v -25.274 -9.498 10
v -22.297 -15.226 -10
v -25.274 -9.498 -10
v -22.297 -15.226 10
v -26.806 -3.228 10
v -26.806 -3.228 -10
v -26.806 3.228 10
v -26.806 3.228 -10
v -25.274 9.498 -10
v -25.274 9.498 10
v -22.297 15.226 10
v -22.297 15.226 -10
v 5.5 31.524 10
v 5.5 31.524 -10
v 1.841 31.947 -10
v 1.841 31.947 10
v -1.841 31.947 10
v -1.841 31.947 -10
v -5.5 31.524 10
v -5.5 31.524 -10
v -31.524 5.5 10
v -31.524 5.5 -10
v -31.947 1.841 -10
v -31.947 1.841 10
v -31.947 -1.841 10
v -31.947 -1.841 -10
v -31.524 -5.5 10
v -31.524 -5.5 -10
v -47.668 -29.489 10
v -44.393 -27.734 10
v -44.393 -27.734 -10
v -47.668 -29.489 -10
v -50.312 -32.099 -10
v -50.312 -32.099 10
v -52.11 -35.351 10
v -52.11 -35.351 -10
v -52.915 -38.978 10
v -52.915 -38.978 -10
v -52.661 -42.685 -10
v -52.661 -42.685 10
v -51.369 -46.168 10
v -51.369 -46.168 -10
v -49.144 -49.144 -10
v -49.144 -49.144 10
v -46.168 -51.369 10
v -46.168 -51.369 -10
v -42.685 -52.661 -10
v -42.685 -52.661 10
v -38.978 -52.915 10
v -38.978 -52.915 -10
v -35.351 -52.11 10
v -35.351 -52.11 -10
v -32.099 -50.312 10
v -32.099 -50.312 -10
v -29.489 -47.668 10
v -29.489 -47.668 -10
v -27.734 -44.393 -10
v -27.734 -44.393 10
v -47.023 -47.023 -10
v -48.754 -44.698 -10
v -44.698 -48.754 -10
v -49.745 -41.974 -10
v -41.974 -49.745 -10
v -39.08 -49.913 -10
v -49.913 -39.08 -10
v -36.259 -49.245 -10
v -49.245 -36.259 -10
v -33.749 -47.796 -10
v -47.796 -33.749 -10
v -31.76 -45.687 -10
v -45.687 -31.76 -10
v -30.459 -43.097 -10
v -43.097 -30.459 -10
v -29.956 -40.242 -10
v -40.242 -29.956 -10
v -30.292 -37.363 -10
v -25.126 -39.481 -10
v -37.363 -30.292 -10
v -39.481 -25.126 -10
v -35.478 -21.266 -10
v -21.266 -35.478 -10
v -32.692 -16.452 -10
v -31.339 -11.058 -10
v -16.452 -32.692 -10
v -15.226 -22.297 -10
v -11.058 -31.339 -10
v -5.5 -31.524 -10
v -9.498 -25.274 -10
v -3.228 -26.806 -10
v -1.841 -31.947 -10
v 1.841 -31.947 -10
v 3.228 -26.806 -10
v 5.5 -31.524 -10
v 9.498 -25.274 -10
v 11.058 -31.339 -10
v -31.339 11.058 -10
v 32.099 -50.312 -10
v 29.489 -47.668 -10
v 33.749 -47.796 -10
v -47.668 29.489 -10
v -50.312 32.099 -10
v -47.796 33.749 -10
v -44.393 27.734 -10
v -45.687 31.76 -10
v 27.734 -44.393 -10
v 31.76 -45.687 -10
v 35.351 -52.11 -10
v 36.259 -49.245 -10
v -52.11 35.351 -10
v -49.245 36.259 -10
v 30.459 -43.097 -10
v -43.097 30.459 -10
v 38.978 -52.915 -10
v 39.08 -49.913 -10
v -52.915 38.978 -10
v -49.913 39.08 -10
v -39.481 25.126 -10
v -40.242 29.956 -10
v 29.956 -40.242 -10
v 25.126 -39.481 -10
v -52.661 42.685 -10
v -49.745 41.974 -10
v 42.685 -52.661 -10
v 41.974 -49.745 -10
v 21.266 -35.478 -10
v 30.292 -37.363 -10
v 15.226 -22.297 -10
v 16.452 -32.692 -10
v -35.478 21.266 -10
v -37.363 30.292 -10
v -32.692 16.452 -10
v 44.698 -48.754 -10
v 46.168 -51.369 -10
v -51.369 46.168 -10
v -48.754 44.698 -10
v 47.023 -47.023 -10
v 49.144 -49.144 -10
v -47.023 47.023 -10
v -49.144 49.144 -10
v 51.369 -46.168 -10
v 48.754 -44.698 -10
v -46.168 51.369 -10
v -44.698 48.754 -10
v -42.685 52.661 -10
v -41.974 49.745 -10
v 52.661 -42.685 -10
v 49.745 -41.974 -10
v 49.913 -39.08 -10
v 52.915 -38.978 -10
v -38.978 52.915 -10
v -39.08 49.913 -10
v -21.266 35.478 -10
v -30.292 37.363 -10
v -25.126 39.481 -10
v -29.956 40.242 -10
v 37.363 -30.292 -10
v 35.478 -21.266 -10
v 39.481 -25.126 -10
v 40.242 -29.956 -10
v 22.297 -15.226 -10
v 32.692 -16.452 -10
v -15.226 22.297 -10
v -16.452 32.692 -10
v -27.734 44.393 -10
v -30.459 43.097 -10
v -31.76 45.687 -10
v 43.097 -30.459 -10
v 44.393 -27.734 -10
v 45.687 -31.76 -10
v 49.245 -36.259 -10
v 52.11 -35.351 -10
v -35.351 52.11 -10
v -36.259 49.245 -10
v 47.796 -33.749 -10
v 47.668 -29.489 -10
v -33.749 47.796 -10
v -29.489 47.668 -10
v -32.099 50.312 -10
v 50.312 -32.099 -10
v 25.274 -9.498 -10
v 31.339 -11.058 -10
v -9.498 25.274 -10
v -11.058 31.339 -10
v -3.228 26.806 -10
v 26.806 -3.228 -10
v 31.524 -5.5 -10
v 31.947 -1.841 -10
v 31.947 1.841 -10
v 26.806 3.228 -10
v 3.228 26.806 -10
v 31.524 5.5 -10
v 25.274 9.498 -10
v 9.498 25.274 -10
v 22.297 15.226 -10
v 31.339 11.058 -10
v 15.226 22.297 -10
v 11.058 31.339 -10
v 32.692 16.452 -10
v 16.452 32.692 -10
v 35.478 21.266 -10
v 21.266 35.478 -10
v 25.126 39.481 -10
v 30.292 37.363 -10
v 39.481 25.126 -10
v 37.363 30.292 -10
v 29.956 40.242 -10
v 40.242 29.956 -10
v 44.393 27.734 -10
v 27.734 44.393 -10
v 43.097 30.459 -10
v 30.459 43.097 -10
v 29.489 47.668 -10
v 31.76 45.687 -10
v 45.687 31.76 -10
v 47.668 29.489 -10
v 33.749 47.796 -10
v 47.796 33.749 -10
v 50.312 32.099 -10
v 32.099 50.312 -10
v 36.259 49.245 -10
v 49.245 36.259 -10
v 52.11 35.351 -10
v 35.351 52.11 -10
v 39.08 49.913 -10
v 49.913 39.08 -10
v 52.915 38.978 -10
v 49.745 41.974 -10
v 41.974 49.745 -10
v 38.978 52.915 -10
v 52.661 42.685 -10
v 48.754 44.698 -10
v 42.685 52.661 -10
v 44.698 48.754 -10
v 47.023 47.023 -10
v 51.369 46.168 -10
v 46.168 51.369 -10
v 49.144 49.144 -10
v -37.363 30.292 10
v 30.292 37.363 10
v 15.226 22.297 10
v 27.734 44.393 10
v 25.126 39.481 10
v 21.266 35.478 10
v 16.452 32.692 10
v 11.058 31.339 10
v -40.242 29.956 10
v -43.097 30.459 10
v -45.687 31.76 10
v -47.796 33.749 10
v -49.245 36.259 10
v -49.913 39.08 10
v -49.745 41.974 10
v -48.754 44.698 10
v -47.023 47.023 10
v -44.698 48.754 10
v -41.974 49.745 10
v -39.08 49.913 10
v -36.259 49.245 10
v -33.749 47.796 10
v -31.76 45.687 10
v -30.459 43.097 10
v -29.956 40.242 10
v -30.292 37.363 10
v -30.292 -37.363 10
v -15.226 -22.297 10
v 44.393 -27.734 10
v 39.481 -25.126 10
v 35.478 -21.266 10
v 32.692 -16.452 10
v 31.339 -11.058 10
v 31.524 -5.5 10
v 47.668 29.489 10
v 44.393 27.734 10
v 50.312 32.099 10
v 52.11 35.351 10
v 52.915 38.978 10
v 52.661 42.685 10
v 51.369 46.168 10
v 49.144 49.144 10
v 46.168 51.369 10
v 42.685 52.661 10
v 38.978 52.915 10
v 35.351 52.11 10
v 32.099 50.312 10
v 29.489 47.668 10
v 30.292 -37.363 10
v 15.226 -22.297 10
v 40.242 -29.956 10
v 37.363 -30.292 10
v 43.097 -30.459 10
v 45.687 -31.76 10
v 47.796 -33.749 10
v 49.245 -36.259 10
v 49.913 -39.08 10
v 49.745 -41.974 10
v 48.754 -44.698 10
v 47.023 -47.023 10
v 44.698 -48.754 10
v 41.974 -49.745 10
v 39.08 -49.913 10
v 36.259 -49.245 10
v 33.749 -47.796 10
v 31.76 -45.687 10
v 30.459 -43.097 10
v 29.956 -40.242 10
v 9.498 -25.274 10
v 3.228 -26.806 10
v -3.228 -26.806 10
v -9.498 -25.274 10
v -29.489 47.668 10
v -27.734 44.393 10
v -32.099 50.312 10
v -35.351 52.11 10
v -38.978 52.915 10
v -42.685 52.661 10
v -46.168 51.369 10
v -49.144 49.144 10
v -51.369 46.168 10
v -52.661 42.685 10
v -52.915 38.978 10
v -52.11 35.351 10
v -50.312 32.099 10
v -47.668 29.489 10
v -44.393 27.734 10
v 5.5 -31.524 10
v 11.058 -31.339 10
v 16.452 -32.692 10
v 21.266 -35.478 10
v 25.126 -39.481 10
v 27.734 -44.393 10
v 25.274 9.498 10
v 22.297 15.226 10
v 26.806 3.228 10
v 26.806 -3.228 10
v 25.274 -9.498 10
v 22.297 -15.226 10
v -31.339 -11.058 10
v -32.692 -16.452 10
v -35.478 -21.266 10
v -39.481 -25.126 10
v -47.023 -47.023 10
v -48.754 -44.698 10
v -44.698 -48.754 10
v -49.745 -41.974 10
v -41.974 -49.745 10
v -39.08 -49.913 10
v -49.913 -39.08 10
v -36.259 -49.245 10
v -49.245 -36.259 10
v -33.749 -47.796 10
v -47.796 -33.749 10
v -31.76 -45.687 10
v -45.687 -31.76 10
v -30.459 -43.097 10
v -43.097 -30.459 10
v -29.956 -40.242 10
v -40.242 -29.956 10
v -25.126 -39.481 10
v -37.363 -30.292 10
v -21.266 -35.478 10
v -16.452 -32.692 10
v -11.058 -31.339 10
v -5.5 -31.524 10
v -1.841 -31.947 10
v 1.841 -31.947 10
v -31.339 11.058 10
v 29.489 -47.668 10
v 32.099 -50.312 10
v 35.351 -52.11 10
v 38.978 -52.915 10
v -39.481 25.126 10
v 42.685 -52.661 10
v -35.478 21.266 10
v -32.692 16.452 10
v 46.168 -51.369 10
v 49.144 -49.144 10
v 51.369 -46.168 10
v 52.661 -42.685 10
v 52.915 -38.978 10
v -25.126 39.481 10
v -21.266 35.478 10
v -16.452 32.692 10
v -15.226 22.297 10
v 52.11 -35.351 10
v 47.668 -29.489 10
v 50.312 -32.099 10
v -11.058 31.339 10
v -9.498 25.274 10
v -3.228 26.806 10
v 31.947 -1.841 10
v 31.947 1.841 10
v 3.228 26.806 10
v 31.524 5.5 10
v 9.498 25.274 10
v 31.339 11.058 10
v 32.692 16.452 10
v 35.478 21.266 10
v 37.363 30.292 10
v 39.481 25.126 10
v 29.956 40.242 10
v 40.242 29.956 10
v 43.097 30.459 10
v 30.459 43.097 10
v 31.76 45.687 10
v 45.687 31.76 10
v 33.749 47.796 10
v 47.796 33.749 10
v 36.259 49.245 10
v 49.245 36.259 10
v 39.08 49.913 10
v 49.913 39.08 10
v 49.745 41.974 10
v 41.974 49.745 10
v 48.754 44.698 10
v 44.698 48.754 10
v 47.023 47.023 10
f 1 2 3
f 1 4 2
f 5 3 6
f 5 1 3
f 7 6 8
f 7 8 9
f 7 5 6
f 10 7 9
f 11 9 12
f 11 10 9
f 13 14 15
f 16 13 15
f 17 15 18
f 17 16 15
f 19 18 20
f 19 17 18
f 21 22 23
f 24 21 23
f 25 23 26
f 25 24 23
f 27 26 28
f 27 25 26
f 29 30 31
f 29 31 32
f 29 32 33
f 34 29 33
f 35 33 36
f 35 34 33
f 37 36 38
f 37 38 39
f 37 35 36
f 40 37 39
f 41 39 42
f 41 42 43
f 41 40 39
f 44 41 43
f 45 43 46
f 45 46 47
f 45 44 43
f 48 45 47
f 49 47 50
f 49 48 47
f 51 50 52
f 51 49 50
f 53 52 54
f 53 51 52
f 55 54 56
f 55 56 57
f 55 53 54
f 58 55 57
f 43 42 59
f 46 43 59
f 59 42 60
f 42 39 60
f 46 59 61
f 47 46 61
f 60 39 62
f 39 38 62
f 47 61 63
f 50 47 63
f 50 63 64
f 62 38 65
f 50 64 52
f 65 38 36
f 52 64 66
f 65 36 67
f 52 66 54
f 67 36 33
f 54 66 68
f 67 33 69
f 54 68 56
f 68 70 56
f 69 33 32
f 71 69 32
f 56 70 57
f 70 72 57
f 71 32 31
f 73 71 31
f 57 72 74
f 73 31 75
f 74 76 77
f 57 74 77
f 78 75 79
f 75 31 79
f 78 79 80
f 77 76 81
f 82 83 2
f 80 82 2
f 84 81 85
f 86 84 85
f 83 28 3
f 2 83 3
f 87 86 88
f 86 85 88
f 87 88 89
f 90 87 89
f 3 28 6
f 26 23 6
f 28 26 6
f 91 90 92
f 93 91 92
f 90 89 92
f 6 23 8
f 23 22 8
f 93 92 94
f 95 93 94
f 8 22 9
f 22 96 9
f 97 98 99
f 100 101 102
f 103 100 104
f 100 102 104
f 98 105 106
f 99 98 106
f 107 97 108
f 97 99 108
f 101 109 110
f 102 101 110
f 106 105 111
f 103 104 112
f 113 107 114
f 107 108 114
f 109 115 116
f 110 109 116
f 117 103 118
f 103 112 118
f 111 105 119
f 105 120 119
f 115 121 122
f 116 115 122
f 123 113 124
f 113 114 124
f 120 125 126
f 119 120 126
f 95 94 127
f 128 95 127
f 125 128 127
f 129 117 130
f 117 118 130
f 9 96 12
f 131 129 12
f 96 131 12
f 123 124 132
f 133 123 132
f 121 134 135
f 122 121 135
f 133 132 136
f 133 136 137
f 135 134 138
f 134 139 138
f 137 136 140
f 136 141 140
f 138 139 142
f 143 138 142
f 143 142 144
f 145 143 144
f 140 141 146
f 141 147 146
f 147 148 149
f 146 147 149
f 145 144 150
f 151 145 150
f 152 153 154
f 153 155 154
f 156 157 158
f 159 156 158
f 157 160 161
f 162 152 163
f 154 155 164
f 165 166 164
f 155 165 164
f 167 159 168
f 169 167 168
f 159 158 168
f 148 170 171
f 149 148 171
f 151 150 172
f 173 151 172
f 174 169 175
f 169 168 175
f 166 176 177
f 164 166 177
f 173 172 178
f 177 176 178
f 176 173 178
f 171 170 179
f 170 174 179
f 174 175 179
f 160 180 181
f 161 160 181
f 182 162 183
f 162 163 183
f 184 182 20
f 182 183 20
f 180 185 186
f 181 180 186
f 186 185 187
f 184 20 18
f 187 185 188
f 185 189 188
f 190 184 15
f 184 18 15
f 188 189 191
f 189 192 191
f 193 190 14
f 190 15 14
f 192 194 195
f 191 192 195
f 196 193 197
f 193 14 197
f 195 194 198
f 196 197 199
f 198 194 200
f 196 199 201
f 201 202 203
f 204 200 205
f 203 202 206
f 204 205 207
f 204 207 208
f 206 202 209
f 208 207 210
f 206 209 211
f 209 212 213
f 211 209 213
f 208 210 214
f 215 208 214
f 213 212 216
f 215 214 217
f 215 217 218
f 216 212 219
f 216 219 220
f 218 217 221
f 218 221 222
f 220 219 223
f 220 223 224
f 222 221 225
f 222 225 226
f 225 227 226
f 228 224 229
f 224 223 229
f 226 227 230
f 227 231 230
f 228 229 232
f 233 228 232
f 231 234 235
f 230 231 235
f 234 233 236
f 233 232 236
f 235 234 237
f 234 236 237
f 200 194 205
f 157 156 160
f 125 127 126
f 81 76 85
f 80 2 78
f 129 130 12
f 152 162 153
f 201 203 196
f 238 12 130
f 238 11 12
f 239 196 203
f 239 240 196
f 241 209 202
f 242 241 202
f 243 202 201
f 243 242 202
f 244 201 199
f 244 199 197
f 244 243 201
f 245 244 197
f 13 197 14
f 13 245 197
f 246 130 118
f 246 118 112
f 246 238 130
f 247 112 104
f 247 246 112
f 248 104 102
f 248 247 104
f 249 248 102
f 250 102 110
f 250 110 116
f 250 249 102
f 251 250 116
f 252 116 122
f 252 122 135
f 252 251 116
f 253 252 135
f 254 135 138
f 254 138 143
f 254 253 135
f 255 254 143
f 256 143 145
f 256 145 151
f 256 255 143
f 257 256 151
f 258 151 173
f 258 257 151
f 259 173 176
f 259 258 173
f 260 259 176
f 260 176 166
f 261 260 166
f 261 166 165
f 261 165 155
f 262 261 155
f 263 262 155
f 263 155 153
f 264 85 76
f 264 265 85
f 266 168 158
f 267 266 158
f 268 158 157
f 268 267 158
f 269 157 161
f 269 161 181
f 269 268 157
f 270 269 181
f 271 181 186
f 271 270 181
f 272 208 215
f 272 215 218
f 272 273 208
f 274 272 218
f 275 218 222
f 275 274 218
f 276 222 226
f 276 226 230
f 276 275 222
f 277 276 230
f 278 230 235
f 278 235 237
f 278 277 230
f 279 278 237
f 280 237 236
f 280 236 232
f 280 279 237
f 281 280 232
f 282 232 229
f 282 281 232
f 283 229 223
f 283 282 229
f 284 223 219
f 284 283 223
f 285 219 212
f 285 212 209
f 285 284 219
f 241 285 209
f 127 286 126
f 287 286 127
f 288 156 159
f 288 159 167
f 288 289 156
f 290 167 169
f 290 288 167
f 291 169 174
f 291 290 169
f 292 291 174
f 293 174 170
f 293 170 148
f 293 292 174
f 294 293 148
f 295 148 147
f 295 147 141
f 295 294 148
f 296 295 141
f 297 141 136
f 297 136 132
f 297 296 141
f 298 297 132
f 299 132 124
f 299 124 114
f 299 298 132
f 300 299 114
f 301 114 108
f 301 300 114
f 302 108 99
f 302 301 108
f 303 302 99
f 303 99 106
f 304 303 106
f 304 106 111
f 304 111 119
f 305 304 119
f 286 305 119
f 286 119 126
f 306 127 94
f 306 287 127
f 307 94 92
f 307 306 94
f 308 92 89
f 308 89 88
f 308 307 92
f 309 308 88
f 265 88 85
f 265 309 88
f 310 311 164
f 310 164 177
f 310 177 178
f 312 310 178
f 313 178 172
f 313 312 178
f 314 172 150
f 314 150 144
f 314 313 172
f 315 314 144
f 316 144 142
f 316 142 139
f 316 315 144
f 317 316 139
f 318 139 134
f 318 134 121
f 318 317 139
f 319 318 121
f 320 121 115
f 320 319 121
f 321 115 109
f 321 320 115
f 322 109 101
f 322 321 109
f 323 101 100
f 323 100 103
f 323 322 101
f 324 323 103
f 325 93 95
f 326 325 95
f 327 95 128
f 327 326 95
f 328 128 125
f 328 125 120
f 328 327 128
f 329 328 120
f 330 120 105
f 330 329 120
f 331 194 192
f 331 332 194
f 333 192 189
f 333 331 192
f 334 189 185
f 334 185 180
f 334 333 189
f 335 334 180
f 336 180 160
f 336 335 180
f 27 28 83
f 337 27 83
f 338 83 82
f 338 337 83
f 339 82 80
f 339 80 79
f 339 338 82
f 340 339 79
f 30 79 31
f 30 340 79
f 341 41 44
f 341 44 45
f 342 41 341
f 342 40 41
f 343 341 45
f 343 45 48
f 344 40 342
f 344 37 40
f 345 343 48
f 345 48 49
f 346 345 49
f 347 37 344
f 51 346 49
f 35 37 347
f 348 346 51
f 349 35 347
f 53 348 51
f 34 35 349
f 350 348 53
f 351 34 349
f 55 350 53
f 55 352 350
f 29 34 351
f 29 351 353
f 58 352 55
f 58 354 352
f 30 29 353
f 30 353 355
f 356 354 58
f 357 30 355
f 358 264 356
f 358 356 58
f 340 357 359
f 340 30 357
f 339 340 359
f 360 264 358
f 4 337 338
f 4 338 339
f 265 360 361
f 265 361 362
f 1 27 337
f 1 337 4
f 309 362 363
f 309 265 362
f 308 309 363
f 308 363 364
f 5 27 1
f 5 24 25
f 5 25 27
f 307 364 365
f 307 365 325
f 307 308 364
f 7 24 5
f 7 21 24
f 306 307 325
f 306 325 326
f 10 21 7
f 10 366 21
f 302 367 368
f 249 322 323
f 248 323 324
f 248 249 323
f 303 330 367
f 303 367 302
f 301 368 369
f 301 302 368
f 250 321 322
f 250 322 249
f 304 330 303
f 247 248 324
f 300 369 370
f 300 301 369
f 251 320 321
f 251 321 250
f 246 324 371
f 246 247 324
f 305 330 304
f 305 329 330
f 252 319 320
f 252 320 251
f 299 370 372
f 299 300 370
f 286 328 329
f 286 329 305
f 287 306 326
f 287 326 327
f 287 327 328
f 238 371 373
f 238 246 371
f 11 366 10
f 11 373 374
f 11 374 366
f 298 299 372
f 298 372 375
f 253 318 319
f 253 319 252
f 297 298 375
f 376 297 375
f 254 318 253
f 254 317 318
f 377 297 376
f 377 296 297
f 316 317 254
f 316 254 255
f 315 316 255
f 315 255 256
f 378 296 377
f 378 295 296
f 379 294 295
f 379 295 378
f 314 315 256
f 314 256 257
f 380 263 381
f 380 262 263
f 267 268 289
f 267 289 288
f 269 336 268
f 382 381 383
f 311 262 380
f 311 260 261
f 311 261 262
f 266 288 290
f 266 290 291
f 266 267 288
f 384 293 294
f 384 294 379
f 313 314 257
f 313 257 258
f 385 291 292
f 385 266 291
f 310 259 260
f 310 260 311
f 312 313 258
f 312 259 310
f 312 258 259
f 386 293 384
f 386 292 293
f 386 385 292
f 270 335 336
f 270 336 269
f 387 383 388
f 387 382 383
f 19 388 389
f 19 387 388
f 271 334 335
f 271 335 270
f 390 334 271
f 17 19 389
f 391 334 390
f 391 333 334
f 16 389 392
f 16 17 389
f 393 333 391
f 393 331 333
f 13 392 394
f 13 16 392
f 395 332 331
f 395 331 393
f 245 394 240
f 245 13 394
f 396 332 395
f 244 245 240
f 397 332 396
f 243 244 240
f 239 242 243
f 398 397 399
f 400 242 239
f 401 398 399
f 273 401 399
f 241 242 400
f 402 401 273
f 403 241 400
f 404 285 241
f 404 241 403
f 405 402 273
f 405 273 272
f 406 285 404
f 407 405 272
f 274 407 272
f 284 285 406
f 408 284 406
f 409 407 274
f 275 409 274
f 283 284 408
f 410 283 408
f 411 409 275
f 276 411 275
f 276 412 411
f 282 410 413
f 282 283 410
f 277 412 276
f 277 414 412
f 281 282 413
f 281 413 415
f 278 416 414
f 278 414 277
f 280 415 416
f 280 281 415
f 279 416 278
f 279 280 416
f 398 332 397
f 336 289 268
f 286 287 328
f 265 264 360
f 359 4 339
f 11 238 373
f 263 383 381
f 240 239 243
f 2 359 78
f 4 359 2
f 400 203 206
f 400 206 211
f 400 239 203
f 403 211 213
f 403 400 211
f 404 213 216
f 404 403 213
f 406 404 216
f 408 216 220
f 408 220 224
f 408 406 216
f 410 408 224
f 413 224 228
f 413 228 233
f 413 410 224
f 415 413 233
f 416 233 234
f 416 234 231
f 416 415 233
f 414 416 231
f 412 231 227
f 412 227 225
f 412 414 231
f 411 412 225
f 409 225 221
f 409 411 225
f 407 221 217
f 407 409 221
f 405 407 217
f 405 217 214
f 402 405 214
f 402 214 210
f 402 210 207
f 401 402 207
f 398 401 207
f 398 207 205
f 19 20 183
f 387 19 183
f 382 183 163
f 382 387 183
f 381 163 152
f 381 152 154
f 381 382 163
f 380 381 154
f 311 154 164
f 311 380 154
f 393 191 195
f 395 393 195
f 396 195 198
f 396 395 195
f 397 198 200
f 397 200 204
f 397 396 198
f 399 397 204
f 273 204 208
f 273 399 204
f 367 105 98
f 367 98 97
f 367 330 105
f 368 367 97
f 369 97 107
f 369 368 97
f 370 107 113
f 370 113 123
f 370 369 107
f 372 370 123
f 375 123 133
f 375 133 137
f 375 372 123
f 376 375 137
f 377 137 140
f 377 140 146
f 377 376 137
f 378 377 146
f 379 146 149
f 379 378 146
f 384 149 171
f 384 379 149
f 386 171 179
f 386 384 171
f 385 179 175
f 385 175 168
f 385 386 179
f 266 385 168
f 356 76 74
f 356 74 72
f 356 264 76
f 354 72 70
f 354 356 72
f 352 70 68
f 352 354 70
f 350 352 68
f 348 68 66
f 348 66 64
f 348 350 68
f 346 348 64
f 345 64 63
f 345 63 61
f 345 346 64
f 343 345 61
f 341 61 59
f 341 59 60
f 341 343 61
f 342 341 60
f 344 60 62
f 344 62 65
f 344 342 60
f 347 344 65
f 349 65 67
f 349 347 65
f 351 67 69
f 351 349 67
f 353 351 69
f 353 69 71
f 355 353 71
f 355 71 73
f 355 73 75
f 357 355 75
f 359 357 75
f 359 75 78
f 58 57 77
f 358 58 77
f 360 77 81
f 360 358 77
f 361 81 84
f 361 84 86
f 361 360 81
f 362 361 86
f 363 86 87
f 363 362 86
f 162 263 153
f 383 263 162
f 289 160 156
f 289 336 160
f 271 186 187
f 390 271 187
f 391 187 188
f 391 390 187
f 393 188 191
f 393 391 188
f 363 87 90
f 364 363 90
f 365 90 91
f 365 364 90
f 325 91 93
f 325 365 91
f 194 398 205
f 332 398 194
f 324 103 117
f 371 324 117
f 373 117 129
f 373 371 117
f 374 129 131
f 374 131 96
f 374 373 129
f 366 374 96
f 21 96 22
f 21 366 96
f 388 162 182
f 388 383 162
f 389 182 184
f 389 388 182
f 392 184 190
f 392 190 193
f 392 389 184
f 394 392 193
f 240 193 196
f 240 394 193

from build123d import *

# Parameters (mm, degrees)
BOSS_EXTRUDE1_DEPTH = 10


with BuildPart() as part:
    # Sketch1 → Boss-Extrude1 (new, symmetric)
    with BuildSketch(Plane.XY):
        with BuildLine():
            ThreePointArc((5.499886369, 31.523820357), (0, 32), (-5.499886369, 31.523820357))
            ThreePointArc((-5.499886369, 31.523820357), (-18.956279365, 33.916662735), (-27.733810979, 44.393071751))
            ThreePointArc((-27.733810979, 44.393071751), (-49.143921292, 49.143921292), (-44.393071751, 27.733810979))
            ThreePointArc((-44.393071751, 27.733810979), (-33.916662735, 18.956279365), (-31.523820357, 5.499886369))
            ThreePointArc((-31.523820357, 5.499886369), (-32, 0), (-31.523820357, -5.499886369))
            ThreePointArc((-31.523820357, -5.499886369), (-33.916662735, -18.956279365), (-44.393071751, -27.733810979))
            ThreePointArc((-44.393071751, -27.733810979), (-49.143921292, -49.143921292), (-27.733810979, -44.393071751))
            ThreePointArc((-27.733810979, -44.393071751), (-18.956279365, -33.916662735), (-5.499886369, -31.523820357))
            ThreePointArc((-5.499886369, -31.523820357), (0, -32), (5.499886369, -31.523820357))
            ThreePointArc((5.499886369, -31.523820357), (18.956279365, -33.916662735), (27.733810979, -44.393071751))
            ThreePointArc((27.733810979, -44.393071751), (49.143921292, -49.143921292), (44.393071751, -27.733810979))
            ThreePointArc((44.393071751, -27.733810979), (33.916662735, -18.956279365), (31.523820357, -5.499886369))
            ThreePointArc((31.523820357, -5.499886369), (32, 0), (31.523820357, 5.499886369))
            ThreePointArc((31.523820357, 5.499886369), (33.916662735, 18.956279365), (44.393071751, 27.733810979))
            ThreePointArc((44.393071751, 27.733810979), (49.143921292, 49.143921292), (27.733810979, 44.393071751))
            ThreePointArc((27.733810979, 44.393071751), (18.956279365, 33.916662735), (5.499886369, 31.523820357))
        make_face()
        with BuildLine():
            Line((37.363342686, 30.292274874), (22.297196945, 15.226129133))
            ThreePointArc((22.297196945, 15.226129133), (27, 0), (22.297196945, -15.226129133))
            Line((22.297196945, -15.226129133), (37.363342686, -30.292274874))
            ThreePointArc((37.363342686, -30.292274874), (47.022600949, -47.022600949), (30.292274874, -37.363342686))
            Line((30.292274874, -37.363342686), (15.226129133, -22.297196945))
            ThreePointArc((15.226129133, -22.297196945), (0, -27), (-15.226129133, -22.297196945))
            Line((-15.226129133, -22.297196945), (-30.292274874, -37.363342686))
            ThreePointArc((-30.292274874, -37.363342686), (-47.022600949, -47.022600949), (-37.363342686, -30.292274874))
            Line((-37.363342686, -30.292274874), (-22.297196945, -15.226129133))
            ThreePointArc((-22.297196945, -15.226129133), (-27, 0), (-22.297196945, 15.226129133))
            Line((-22.297196945, 15.226129133), (-37.363342686, 30.292274874))
            ThreePointArc((-37.363342686, 30.292274874), (-47.022600949, 47.022600949), (-30.292274874, 37.363342686))
            Line((-30.292274874, 37.363342686), (-15.226129133, 22.297196945))
            ThreePointArc((-15.226129133, 22.297196945), (0, 27), (15.226129133, 22.297196945))
            Line((15.226129133, 22.297196945), (30.292274874, 37.363342686))
            ThreePointArc((30.292274874, 37.363342686), (47.022600949, 47.022600949), (37.363342686, 30.292274874))
        make_face(mode=Mode.SUBTRACT)
    extrude(amount=BOSS_EXTRUDE1_DEPTH, both=True)


solid = part.part
